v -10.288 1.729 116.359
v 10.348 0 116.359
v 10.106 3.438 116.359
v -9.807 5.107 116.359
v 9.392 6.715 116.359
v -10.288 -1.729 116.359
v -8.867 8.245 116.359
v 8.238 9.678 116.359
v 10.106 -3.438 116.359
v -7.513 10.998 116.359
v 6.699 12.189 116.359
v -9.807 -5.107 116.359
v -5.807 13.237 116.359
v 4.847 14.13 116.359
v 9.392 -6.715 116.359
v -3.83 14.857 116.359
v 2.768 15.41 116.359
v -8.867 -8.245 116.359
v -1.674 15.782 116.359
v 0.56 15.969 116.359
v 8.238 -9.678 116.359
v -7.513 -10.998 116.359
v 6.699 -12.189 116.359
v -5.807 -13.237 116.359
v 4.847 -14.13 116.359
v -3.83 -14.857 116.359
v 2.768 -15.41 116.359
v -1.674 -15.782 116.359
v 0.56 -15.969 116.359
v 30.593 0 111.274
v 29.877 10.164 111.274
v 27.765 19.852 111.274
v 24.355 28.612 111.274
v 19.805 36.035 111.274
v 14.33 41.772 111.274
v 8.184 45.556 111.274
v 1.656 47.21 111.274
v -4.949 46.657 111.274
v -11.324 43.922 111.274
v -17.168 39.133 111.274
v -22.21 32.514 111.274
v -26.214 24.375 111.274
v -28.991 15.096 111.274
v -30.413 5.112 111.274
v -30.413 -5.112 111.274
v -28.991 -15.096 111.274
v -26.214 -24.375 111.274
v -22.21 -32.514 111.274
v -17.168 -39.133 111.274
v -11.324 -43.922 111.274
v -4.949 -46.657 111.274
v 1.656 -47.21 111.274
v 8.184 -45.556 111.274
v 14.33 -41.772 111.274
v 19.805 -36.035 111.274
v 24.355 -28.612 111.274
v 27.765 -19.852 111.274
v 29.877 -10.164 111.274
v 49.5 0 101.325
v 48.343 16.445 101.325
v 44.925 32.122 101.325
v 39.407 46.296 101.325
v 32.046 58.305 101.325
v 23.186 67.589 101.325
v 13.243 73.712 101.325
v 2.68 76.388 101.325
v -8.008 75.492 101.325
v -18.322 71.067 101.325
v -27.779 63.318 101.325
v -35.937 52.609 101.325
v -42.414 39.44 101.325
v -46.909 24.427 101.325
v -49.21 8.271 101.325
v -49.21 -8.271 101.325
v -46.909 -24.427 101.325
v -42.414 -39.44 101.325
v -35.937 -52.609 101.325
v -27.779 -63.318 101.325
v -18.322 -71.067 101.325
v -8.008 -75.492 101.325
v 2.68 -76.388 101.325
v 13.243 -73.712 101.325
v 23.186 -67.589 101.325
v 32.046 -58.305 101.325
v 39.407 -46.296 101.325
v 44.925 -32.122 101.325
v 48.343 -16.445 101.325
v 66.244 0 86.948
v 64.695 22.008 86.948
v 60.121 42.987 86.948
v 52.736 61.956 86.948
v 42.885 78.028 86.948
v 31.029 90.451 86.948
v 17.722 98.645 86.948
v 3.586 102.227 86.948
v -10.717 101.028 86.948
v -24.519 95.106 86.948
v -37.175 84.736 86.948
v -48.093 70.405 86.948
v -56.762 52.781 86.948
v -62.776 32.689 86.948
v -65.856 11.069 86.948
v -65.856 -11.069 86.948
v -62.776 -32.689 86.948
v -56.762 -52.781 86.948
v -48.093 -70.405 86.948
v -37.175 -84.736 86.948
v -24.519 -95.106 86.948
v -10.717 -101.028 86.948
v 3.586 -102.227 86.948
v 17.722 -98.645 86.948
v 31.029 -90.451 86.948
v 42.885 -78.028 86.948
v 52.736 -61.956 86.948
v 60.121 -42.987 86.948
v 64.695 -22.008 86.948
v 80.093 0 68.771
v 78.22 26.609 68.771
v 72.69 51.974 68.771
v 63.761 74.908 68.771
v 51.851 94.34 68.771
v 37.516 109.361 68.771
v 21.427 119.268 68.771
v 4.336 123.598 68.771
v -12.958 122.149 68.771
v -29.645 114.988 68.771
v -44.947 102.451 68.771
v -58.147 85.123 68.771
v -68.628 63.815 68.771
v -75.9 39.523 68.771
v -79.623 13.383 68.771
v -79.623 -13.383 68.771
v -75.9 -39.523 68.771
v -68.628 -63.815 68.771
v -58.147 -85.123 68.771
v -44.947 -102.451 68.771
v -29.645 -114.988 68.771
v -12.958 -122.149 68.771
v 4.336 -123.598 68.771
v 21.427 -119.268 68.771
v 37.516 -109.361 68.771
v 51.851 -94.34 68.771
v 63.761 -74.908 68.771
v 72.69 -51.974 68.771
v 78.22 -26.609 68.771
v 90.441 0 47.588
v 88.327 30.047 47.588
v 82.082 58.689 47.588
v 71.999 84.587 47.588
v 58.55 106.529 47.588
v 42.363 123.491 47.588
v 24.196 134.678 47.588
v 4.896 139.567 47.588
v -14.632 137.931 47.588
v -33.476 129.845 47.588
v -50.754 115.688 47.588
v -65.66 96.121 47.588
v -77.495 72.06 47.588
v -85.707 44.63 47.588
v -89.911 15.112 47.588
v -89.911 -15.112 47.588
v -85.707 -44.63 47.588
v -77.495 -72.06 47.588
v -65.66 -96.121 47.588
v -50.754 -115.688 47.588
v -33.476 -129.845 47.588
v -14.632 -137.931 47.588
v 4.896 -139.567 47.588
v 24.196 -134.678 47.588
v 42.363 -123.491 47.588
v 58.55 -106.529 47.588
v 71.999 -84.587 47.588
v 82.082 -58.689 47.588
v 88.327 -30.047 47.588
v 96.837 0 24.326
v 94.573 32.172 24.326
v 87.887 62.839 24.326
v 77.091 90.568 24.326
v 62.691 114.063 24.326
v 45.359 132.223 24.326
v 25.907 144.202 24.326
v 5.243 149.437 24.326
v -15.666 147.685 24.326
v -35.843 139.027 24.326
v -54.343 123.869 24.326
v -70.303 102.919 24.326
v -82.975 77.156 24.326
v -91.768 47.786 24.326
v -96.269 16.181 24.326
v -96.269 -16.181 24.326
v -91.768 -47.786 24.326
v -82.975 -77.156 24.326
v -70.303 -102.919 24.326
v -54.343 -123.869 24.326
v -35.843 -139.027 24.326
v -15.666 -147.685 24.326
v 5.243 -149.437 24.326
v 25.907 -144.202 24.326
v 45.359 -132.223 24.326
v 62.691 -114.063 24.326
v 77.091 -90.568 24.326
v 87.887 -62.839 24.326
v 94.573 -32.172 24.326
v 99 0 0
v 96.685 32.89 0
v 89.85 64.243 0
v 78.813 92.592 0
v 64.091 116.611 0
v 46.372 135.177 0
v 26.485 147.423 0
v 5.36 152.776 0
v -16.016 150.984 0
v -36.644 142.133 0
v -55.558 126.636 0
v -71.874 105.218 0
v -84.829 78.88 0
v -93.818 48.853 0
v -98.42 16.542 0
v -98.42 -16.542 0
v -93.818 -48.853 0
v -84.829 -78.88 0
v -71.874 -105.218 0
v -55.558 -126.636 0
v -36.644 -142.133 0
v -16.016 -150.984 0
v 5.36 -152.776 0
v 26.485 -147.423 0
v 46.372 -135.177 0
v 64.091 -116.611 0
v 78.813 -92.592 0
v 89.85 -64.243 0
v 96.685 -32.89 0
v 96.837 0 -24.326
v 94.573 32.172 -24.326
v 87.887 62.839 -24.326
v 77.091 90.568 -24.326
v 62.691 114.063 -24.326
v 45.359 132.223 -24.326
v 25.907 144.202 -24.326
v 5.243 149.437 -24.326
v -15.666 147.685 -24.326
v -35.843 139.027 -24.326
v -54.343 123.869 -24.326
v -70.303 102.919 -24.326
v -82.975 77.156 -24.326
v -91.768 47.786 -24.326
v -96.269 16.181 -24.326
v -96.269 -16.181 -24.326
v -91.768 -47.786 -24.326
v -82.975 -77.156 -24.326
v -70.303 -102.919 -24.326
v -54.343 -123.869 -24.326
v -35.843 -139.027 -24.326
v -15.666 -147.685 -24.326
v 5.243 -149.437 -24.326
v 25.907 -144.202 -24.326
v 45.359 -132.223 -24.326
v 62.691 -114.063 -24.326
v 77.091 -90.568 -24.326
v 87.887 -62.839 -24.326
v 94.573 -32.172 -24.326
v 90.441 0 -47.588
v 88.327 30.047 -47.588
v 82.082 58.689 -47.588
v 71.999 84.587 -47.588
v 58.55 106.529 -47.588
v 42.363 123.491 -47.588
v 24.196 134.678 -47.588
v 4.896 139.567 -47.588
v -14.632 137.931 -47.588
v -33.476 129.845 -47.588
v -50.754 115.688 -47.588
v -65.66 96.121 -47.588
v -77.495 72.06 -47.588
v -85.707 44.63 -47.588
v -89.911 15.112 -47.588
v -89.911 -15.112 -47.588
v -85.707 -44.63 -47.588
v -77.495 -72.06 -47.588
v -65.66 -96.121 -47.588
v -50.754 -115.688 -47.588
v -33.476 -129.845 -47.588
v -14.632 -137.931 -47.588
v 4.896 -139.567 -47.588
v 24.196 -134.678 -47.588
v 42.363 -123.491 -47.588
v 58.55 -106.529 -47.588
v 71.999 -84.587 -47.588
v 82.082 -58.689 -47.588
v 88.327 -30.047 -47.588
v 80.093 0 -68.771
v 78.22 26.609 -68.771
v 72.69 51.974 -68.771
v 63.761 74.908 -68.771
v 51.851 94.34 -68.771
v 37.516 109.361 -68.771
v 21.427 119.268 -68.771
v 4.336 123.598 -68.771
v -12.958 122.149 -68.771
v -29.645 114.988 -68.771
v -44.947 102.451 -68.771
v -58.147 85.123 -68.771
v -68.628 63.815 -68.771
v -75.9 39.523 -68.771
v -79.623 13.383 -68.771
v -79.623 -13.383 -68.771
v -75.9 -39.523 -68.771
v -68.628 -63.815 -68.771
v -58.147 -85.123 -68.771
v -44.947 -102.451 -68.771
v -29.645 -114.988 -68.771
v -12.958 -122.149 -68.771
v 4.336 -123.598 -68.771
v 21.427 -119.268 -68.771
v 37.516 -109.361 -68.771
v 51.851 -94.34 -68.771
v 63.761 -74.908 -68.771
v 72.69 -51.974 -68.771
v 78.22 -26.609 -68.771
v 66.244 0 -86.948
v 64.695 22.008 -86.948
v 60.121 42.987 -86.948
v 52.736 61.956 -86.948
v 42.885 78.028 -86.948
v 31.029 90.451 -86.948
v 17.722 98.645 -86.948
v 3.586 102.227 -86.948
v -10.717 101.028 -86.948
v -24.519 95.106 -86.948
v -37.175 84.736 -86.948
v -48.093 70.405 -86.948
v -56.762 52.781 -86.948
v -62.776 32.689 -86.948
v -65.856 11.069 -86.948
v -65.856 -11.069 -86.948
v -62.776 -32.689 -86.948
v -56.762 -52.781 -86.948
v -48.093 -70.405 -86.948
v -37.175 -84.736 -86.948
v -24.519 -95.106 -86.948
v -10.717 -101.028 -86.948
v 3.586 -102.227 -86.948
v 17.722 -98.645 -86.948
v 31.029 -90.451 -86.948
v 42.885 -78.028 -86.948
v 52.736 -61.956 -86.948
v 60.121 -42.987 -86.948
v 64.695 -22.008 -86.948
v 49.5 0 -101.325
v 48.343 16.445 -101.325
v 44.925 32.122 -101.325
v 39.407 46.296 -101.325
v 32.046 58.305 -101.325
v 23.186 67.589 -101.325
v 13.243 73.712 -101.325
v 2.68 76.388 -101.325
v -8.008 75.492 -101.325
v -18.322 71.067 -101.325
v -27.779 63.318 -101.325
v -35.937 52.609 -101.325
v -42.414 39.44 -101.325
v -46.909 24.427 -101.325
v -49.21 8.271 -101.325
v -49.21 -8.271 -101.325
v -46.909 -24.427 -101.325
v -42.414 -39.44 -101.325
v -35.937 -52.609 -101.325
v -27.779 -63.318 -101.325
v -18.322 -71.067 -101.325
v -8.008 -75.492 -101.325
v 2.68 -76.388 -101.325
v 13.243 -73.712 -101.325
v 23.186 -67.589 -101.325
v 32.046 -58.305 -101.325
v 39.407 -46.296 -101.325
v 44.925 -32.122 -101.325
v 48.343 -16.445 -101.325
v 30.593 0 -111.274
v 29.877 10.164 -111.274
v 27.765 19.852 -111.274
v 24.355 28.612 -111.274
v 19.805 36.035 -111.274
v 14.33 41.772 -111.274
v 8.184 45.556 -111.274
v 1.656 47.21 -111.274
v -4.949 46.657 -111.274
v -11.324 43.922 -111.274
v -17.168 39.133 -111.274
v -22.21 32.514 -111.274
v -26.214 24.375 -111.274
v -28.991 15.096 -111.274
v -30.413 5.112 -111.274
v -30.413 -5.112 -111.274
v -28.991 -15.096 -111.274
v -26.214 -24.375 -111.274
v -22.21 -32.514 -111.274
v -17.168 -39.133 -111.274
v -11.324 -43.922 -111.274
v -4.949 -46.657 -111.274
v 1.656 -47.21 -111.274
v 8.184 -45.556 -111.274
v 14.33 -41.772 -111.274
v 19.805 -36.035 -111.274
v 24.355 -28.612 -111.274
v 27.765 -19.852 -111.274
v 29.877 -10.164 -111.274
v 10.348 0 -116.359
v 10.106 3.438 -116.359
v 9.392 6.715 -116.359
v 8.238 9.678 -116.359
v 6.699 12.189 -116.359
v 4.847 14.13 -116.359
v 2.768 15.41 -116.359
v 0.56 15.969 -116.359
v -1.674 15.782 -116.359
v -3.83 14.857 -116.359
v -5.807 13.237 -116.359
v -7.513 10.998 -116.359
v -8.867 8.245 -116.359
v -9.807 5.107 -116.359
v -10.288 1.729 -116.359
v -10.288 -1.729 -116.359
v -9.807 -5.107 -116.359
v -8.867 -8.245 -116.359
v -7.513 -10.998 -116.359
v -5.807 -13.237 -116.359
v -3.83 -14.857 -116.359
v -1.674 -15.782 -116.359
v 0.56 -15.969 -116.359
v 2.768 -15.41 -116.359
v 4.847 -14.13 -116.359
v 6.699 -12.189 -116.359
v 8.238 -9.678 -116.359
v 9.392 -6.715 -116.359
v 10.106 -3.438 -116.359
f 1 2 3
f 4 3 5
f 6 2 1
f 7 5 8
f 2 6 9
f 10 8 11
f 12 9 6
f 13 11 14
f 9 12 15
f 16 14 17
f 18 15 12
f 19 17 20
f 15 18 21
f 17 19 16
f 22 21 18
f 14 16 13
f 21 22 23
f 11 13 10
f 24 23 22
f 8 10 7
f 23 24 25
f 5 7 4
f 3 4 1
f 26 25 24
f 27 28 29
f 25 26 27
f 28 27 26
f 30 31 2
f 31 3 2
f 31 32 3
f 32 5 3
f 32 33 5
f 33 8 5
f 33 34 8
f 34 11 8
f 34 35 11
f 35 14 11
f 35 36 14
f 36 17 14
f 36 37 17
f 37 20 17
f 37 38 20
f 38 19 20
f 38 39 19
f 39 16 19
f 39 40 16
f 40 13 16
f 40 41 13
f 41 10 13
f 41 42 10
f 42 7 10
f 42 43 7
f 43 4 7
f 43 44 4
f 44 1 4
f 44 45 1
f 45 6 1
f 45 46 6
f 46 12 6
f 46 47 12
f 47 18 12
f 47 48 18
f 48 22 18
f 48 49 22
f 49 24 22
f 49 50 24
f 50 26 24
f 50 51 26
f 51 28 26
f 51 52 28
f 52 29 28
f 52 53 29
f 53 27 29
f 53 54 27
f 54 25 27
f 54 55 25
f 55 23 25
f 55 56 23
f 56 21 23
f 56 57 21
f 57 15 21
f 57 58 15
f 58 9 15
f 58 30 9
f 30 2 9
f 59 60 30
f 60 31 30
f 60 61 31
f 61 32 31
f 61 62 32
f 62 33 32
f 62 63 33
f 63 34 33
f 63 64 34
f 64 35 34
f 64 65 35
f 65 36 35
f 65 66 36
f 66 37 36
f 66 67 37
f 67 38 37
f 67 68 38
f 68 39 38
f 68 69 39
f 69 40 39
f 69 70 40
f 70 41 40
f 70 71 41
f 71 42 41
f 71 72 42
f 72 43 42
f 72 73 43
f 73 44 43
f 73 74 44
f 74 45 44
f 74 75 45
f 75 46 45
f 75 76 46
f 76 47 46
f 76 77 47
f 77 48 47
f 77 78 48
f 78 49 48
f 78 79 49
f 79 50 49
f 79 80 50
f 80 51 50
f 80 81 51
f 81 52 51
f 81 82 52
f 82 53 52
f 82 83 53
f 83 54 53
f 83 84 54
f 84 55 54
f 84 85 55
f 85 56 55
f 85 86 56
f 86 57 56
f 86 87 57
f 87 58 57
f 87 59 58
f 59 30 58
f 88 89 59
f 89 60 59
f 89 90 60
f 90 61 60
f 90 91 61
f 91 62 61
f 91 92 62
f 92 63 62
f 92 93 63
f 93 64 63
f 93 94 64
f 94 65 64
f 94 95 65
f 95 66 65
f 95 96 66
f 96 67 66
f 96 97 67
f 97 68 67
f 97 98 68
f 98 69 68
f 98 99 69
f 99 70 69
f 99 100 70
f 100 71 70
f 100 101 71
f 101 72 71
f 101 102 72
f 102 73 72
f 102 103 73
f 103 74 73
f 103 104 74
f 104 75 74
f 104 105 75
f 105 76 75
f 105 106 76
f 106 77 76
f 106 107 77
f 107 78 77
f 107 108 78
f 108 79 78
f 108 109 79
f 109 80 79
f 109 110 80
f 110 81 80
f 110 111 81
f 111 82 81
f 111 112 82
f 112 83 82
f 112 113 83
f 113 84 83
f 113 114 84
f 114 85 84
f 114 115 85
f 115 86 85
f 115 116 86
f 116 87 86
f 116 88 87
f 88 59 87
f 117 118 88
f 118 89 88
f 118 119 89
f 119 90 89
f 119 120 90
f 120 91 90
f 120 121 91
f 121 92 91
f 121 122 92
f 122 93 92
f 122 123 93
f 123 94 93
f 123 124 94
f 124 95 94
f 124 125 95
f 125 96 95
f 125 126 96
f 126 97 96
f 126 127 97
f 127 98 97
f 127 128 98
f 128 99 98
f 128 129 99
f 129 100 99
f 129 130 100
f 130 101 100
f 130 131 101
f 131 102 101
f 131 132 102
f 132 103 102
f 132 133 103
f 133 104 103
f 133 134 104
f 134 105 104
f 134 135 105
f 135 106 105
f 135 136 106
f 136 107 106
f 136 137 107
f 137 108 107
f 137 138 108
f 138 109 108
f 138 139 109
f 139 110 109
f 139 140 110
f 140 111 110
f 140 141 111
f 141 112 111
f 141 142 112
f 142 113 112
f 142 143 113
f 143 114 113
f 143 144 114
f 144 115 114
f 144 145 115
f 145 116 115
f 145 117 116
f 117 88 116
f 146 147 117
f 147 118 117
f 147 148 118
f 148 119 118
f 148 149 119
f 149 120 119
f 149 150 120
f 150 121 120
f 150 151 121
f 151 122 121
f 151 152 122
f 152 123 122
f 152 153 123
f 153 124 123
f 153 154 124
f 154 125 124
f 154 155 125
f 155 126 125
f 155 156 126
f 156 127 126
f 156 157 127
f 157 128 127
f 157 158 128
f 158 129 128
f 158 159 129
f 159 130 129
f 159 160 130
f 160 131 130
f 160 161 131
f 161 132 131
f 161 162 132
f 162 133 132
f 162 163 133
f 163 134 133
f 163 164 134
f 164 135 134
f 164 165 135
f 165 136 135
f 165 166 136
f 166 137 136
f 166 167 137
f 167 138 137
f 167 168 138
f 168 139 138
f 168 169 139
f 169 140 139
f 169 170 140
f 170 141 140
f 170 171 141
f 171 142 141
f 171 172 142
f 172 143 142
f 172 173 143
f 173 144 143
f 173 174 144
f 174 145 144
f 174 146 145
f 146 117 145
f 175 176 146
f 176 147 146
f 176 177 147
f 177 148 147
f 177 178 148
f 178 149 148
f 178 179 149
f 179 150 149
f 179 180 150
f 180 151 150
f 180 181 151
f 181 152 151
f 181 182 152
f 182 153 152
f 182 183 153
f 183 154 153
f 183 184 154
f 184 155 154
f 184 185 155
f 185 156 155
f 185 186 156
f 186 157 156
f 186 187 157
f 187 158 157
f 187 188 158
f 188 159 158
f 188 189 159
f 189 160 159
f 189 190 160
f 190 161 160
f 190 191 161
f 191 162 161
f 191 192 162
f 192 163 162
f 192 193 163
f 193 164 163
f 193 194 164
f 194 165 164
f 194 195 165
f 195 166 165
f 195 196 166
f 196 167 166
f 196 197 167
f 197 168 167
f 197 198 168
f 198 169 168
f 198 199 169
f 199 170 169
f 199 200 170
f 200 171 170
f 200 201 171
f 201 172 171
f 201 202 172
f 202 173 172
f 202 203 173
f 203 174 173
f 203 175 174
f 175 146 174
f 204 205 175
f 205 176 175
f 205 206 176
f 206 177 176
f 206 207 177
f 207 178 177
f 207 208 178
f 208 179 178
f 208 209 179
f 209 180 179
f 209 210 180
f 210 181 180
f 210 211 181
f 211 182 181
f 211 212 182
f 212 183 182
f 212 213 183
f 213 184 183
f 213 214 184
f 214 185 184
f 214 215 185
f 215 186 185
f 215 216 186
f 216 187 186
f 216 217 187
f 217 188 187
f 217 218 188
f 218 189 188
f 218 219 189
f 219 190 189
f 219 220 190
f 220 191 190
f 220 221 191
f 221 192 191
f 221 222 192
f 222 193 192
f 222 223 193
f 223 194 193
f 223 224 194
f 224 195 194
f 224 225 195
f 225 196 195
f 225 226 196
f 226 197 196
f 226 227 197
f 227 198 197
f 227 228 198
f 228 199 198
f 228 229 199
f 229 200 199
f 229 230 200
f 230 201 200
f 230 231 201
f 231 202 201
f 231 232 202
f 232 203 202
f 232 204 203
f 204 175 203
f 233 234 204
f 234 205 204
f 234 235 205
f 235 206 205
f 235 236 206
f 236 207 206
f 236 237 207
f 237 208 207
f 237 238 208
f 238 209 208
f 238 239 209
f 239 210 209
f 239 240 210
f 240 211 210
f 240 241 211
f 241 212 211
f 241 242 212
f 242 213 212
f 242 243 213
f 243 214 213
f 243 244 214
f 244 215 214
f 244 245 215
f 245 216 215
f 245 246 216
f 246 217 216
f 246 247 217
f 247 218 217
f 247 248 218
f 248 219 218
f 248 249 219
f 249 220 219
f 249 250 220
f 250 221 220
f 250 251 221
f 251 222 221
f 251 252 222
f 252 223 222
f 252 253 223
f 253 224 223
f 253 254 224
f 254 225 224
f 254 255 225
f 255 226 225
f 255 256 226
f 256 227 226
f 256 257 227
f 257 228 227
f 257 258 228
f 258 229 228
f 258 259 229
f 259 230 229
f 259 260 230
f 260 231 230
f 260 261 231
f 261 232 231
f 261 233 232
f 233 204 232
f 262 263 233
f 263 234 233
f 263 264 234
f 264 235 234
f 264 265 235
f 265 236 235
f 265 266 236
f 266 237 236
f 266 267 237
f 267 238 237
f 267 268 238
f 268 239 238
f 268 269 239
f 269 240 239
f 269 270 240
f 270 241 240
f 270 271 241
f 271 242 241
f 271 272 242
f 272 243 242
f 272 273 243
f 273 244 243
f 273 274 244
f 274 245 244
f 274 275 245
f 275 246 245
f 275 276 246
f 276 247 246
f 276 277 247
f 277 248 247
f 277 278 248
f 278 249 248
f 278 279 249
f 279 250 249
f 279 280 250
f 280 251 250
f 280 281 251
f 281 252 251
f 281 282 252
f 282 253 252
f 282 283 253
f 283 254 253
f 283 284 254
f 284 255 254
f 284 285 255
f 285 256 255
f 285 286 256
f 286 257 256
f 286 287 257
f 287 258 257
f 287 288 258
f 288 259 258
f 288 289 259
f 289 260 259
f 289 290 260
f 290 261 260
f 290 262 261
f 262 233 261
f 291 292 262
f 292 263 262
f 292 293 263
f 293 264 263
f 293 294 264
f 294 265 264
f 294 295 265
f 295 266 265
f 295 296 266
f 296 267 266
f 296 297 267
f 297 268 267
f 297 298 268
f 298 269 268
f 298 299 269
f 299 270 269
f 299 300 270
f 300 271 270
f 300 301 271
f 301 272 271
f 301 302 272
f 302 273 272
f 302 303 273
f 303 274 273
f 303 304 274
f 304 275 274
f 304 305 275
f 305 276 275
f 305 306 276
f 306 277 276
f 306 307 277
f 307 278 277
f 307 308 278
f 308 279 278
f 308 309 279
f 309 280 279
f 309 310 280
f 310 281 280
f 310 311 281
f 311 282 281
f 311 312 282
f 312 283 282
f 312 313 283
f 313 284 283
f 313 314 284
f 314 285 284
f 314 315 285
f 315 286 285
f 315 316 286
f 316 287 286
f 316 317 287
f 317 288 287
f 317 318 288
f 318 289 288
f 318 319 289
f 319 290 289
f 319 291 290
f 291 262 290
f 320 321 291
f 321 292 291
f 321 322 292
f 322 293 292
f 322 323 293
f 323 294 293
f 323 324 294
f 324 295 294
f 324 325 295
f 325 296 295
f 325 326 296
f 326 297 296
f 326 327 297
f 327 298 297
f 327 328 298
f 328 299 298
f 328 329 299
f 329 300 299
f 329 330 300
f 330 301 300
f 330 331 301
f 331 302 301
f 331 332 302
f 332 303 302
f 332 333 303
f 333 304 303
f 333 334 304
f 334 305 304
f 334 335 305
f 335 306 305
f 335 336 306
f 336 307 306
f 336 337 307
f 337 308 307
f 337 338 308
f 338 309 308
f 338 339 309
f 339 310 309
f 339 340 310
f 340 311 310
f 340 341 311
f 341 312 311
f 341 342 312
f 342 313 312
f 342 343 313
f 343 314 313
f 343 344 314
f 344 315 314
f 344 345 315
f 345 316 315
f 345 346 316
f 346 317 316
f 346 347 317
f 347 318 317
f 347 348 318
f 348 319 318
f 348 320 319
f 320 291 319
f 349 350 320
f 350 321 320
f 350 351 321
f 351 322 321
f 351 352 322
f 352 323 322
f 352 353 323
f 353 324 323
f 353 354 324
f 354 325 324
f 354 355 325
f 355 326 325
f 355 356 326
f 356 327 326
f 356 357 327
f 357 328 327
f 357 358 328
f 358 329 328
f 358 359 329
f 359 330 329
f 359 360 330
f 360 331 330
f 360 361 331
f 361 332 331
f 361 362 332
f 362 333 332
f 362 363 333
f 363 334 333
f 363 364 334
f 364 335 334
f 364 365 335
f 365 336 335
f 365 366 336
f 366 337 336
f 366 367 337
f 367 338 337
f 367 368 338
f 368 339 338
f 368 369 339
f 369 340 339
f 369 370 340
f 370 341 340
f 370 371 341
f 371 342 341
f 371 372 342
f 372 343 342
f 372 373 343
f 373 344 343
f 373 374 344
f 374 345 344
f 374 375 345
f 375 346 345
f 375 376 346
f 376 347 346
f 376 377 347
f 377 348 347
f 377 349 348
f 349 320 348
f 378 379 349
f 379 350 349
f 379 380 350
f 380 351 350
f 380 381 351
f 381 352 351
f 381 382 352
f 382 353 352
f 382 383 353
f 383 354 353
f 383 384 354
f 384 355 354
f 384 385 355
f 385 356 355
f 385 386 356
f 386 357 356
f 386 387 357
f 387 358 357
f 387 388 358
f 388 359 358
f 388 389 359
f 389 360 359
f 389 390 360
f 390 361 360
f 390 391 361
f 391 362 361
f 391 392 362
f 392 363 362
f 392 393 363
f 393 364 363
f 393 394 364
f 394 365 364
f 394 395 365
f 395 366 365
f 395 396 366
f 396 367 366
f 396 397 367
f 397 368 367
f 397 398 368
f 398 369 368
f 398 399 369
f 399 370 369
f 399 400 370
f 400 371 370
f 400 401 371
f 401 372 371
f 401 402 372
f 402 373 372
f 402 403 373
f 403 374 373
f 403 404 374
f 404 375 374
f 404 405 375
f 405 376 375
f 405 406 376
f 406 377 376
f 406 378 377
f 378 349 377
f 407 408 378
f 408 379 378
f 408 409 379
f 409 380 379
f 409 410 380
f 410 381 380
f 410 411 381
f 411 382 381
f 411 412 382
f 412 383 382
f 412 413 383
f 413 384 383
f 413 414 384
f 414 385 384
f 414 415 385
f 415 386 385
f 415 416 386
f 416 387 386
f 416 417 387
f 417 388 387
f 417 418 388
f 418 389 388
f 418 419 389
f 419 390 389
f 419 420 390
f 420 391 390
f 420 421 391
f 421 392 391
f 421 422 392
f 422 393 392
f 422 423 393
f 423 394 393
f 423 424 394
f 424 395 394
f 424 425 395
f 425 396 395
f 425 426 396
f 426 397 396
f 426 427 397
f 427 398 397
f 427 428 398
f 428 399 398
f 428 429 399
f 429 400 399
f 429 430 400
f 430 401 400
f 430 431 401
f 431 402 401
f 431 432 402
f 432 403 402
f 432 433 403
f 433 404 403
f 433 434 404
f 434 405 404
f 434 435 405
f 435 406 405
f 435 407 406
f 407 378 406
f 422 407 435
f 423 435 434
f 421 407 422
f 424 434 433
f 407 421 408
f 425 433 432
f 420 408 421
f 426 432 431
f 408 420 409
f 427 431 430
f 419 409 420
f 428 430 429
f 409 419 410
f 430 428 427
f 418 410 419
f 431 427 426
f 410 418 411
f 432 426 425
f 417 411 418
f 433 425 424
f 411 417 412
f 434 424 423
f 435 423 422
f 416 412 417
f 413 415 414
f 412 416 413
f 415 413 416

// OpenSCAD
// Generated by SolidPython 1.0.1 on 2020-07-29 00:46:50


scale(v = [11, 17, 13]) {
	sphere(r = 9);
}
/***********************************************
*********      SolidPython code:      **********
************************************************
 
# import packages: SolidPython
from solid import *
from solid.utils import *
from itertools import chain, combinations, permutations


class Resize:

    def __init__(self, scad_file):
        self.scad_file = scad_file
        #self.scad_file = import_scad(scad_file)
        # cone/cylinder param:
        self.r1 = 0
        self.r2 = 0
        self.h = 0
        # rectangular prism param:
        self.w = 0
        self.l = 0
        # ellipse param:
        self.r = 0

    # import OpenScad code (file name corresponds to shape)


    # classify shape + parameters
    def assign(self, param1, param2, param3):
        if self.scad_file == 'cone.scad':
            self.r1 = param1
            self.r2 = param2
            self.h = param3
        elif self.scad_file == 'cylinder.scad':
            self.r1 = param1
            self.r2 = param2
            self.h = param3
        elif self.scad_file == 'rectangularPrism.scad':
            self.h = param1
            self.l = param2
            self.w = param3
        else:
            self.r = param1
            self.h = param2

    # resize parameters
    def iterate(self):
        x = range(3, 20, 2)
        i = 1
        if self.scad_file == 'cone.scad':
            tempList = list(permutations(x, 2))
            for temp in tempList:
                param1 = temp[0]
                param2 = temp[1]
                filepath = 'produced_scad_files/' + 'cone' + str(param1) + '_' + str(param2) + '_' + '.scad'
                scad_render_to_file(cylinder(h=param1, r1=param2, r2=0), filepath)

        elif self.scad_file == 'cylinder.scad':
            tempList = list(permutations(x, 3))
            for temp in tempList:
                param1 = temp[0]
                param2 = temp[1]
                filepath = 'produced_scad_files/' + 'cylinder' + str(param1) + '_' + str(param2) + '_' + '.scad'
                scad_render_to_file(cylinder(h=param1, r1=param2, r2=param2), filepath)

        elif self.scad_file == 'rectangularPrism.scad':
            tempList = list(permutations(x, 3))
            for temp in tempList:
                param1 = temp[0]
                param2 = temp[1]
                param3 = temp[2]
                filepath = 'produced_scad_files/' + 'rectangularPrism' + str(param1) + '_' + str(param2) + '_' + str(
                    param3) + '.scad'
                scad_render_to_file(cube(size=(param1, param2, param3)), filepath)

        elif self.scad_file == 'ellipse.scad':
            tempList = list(permutations(x, 4))
            for temp in tempList:
                param1 = temp[0]
                param2 = temp[1]
                param3 = temp[2]
                param4 = temp[3]
                filepath = 'produced_scad_files/' + 'ellipse' + str(param1) + '_' + str(param2) + '_' + str(param3) + '_' + str(param4) + '.scad'
                scad_render_to_file(scale([param1, param2, param3])(sphere(r=param4)), filepath)

    def render_to_scadfile(self):
        scad_render_to_file(scad, 'example.scad') 
 
************************************************/
